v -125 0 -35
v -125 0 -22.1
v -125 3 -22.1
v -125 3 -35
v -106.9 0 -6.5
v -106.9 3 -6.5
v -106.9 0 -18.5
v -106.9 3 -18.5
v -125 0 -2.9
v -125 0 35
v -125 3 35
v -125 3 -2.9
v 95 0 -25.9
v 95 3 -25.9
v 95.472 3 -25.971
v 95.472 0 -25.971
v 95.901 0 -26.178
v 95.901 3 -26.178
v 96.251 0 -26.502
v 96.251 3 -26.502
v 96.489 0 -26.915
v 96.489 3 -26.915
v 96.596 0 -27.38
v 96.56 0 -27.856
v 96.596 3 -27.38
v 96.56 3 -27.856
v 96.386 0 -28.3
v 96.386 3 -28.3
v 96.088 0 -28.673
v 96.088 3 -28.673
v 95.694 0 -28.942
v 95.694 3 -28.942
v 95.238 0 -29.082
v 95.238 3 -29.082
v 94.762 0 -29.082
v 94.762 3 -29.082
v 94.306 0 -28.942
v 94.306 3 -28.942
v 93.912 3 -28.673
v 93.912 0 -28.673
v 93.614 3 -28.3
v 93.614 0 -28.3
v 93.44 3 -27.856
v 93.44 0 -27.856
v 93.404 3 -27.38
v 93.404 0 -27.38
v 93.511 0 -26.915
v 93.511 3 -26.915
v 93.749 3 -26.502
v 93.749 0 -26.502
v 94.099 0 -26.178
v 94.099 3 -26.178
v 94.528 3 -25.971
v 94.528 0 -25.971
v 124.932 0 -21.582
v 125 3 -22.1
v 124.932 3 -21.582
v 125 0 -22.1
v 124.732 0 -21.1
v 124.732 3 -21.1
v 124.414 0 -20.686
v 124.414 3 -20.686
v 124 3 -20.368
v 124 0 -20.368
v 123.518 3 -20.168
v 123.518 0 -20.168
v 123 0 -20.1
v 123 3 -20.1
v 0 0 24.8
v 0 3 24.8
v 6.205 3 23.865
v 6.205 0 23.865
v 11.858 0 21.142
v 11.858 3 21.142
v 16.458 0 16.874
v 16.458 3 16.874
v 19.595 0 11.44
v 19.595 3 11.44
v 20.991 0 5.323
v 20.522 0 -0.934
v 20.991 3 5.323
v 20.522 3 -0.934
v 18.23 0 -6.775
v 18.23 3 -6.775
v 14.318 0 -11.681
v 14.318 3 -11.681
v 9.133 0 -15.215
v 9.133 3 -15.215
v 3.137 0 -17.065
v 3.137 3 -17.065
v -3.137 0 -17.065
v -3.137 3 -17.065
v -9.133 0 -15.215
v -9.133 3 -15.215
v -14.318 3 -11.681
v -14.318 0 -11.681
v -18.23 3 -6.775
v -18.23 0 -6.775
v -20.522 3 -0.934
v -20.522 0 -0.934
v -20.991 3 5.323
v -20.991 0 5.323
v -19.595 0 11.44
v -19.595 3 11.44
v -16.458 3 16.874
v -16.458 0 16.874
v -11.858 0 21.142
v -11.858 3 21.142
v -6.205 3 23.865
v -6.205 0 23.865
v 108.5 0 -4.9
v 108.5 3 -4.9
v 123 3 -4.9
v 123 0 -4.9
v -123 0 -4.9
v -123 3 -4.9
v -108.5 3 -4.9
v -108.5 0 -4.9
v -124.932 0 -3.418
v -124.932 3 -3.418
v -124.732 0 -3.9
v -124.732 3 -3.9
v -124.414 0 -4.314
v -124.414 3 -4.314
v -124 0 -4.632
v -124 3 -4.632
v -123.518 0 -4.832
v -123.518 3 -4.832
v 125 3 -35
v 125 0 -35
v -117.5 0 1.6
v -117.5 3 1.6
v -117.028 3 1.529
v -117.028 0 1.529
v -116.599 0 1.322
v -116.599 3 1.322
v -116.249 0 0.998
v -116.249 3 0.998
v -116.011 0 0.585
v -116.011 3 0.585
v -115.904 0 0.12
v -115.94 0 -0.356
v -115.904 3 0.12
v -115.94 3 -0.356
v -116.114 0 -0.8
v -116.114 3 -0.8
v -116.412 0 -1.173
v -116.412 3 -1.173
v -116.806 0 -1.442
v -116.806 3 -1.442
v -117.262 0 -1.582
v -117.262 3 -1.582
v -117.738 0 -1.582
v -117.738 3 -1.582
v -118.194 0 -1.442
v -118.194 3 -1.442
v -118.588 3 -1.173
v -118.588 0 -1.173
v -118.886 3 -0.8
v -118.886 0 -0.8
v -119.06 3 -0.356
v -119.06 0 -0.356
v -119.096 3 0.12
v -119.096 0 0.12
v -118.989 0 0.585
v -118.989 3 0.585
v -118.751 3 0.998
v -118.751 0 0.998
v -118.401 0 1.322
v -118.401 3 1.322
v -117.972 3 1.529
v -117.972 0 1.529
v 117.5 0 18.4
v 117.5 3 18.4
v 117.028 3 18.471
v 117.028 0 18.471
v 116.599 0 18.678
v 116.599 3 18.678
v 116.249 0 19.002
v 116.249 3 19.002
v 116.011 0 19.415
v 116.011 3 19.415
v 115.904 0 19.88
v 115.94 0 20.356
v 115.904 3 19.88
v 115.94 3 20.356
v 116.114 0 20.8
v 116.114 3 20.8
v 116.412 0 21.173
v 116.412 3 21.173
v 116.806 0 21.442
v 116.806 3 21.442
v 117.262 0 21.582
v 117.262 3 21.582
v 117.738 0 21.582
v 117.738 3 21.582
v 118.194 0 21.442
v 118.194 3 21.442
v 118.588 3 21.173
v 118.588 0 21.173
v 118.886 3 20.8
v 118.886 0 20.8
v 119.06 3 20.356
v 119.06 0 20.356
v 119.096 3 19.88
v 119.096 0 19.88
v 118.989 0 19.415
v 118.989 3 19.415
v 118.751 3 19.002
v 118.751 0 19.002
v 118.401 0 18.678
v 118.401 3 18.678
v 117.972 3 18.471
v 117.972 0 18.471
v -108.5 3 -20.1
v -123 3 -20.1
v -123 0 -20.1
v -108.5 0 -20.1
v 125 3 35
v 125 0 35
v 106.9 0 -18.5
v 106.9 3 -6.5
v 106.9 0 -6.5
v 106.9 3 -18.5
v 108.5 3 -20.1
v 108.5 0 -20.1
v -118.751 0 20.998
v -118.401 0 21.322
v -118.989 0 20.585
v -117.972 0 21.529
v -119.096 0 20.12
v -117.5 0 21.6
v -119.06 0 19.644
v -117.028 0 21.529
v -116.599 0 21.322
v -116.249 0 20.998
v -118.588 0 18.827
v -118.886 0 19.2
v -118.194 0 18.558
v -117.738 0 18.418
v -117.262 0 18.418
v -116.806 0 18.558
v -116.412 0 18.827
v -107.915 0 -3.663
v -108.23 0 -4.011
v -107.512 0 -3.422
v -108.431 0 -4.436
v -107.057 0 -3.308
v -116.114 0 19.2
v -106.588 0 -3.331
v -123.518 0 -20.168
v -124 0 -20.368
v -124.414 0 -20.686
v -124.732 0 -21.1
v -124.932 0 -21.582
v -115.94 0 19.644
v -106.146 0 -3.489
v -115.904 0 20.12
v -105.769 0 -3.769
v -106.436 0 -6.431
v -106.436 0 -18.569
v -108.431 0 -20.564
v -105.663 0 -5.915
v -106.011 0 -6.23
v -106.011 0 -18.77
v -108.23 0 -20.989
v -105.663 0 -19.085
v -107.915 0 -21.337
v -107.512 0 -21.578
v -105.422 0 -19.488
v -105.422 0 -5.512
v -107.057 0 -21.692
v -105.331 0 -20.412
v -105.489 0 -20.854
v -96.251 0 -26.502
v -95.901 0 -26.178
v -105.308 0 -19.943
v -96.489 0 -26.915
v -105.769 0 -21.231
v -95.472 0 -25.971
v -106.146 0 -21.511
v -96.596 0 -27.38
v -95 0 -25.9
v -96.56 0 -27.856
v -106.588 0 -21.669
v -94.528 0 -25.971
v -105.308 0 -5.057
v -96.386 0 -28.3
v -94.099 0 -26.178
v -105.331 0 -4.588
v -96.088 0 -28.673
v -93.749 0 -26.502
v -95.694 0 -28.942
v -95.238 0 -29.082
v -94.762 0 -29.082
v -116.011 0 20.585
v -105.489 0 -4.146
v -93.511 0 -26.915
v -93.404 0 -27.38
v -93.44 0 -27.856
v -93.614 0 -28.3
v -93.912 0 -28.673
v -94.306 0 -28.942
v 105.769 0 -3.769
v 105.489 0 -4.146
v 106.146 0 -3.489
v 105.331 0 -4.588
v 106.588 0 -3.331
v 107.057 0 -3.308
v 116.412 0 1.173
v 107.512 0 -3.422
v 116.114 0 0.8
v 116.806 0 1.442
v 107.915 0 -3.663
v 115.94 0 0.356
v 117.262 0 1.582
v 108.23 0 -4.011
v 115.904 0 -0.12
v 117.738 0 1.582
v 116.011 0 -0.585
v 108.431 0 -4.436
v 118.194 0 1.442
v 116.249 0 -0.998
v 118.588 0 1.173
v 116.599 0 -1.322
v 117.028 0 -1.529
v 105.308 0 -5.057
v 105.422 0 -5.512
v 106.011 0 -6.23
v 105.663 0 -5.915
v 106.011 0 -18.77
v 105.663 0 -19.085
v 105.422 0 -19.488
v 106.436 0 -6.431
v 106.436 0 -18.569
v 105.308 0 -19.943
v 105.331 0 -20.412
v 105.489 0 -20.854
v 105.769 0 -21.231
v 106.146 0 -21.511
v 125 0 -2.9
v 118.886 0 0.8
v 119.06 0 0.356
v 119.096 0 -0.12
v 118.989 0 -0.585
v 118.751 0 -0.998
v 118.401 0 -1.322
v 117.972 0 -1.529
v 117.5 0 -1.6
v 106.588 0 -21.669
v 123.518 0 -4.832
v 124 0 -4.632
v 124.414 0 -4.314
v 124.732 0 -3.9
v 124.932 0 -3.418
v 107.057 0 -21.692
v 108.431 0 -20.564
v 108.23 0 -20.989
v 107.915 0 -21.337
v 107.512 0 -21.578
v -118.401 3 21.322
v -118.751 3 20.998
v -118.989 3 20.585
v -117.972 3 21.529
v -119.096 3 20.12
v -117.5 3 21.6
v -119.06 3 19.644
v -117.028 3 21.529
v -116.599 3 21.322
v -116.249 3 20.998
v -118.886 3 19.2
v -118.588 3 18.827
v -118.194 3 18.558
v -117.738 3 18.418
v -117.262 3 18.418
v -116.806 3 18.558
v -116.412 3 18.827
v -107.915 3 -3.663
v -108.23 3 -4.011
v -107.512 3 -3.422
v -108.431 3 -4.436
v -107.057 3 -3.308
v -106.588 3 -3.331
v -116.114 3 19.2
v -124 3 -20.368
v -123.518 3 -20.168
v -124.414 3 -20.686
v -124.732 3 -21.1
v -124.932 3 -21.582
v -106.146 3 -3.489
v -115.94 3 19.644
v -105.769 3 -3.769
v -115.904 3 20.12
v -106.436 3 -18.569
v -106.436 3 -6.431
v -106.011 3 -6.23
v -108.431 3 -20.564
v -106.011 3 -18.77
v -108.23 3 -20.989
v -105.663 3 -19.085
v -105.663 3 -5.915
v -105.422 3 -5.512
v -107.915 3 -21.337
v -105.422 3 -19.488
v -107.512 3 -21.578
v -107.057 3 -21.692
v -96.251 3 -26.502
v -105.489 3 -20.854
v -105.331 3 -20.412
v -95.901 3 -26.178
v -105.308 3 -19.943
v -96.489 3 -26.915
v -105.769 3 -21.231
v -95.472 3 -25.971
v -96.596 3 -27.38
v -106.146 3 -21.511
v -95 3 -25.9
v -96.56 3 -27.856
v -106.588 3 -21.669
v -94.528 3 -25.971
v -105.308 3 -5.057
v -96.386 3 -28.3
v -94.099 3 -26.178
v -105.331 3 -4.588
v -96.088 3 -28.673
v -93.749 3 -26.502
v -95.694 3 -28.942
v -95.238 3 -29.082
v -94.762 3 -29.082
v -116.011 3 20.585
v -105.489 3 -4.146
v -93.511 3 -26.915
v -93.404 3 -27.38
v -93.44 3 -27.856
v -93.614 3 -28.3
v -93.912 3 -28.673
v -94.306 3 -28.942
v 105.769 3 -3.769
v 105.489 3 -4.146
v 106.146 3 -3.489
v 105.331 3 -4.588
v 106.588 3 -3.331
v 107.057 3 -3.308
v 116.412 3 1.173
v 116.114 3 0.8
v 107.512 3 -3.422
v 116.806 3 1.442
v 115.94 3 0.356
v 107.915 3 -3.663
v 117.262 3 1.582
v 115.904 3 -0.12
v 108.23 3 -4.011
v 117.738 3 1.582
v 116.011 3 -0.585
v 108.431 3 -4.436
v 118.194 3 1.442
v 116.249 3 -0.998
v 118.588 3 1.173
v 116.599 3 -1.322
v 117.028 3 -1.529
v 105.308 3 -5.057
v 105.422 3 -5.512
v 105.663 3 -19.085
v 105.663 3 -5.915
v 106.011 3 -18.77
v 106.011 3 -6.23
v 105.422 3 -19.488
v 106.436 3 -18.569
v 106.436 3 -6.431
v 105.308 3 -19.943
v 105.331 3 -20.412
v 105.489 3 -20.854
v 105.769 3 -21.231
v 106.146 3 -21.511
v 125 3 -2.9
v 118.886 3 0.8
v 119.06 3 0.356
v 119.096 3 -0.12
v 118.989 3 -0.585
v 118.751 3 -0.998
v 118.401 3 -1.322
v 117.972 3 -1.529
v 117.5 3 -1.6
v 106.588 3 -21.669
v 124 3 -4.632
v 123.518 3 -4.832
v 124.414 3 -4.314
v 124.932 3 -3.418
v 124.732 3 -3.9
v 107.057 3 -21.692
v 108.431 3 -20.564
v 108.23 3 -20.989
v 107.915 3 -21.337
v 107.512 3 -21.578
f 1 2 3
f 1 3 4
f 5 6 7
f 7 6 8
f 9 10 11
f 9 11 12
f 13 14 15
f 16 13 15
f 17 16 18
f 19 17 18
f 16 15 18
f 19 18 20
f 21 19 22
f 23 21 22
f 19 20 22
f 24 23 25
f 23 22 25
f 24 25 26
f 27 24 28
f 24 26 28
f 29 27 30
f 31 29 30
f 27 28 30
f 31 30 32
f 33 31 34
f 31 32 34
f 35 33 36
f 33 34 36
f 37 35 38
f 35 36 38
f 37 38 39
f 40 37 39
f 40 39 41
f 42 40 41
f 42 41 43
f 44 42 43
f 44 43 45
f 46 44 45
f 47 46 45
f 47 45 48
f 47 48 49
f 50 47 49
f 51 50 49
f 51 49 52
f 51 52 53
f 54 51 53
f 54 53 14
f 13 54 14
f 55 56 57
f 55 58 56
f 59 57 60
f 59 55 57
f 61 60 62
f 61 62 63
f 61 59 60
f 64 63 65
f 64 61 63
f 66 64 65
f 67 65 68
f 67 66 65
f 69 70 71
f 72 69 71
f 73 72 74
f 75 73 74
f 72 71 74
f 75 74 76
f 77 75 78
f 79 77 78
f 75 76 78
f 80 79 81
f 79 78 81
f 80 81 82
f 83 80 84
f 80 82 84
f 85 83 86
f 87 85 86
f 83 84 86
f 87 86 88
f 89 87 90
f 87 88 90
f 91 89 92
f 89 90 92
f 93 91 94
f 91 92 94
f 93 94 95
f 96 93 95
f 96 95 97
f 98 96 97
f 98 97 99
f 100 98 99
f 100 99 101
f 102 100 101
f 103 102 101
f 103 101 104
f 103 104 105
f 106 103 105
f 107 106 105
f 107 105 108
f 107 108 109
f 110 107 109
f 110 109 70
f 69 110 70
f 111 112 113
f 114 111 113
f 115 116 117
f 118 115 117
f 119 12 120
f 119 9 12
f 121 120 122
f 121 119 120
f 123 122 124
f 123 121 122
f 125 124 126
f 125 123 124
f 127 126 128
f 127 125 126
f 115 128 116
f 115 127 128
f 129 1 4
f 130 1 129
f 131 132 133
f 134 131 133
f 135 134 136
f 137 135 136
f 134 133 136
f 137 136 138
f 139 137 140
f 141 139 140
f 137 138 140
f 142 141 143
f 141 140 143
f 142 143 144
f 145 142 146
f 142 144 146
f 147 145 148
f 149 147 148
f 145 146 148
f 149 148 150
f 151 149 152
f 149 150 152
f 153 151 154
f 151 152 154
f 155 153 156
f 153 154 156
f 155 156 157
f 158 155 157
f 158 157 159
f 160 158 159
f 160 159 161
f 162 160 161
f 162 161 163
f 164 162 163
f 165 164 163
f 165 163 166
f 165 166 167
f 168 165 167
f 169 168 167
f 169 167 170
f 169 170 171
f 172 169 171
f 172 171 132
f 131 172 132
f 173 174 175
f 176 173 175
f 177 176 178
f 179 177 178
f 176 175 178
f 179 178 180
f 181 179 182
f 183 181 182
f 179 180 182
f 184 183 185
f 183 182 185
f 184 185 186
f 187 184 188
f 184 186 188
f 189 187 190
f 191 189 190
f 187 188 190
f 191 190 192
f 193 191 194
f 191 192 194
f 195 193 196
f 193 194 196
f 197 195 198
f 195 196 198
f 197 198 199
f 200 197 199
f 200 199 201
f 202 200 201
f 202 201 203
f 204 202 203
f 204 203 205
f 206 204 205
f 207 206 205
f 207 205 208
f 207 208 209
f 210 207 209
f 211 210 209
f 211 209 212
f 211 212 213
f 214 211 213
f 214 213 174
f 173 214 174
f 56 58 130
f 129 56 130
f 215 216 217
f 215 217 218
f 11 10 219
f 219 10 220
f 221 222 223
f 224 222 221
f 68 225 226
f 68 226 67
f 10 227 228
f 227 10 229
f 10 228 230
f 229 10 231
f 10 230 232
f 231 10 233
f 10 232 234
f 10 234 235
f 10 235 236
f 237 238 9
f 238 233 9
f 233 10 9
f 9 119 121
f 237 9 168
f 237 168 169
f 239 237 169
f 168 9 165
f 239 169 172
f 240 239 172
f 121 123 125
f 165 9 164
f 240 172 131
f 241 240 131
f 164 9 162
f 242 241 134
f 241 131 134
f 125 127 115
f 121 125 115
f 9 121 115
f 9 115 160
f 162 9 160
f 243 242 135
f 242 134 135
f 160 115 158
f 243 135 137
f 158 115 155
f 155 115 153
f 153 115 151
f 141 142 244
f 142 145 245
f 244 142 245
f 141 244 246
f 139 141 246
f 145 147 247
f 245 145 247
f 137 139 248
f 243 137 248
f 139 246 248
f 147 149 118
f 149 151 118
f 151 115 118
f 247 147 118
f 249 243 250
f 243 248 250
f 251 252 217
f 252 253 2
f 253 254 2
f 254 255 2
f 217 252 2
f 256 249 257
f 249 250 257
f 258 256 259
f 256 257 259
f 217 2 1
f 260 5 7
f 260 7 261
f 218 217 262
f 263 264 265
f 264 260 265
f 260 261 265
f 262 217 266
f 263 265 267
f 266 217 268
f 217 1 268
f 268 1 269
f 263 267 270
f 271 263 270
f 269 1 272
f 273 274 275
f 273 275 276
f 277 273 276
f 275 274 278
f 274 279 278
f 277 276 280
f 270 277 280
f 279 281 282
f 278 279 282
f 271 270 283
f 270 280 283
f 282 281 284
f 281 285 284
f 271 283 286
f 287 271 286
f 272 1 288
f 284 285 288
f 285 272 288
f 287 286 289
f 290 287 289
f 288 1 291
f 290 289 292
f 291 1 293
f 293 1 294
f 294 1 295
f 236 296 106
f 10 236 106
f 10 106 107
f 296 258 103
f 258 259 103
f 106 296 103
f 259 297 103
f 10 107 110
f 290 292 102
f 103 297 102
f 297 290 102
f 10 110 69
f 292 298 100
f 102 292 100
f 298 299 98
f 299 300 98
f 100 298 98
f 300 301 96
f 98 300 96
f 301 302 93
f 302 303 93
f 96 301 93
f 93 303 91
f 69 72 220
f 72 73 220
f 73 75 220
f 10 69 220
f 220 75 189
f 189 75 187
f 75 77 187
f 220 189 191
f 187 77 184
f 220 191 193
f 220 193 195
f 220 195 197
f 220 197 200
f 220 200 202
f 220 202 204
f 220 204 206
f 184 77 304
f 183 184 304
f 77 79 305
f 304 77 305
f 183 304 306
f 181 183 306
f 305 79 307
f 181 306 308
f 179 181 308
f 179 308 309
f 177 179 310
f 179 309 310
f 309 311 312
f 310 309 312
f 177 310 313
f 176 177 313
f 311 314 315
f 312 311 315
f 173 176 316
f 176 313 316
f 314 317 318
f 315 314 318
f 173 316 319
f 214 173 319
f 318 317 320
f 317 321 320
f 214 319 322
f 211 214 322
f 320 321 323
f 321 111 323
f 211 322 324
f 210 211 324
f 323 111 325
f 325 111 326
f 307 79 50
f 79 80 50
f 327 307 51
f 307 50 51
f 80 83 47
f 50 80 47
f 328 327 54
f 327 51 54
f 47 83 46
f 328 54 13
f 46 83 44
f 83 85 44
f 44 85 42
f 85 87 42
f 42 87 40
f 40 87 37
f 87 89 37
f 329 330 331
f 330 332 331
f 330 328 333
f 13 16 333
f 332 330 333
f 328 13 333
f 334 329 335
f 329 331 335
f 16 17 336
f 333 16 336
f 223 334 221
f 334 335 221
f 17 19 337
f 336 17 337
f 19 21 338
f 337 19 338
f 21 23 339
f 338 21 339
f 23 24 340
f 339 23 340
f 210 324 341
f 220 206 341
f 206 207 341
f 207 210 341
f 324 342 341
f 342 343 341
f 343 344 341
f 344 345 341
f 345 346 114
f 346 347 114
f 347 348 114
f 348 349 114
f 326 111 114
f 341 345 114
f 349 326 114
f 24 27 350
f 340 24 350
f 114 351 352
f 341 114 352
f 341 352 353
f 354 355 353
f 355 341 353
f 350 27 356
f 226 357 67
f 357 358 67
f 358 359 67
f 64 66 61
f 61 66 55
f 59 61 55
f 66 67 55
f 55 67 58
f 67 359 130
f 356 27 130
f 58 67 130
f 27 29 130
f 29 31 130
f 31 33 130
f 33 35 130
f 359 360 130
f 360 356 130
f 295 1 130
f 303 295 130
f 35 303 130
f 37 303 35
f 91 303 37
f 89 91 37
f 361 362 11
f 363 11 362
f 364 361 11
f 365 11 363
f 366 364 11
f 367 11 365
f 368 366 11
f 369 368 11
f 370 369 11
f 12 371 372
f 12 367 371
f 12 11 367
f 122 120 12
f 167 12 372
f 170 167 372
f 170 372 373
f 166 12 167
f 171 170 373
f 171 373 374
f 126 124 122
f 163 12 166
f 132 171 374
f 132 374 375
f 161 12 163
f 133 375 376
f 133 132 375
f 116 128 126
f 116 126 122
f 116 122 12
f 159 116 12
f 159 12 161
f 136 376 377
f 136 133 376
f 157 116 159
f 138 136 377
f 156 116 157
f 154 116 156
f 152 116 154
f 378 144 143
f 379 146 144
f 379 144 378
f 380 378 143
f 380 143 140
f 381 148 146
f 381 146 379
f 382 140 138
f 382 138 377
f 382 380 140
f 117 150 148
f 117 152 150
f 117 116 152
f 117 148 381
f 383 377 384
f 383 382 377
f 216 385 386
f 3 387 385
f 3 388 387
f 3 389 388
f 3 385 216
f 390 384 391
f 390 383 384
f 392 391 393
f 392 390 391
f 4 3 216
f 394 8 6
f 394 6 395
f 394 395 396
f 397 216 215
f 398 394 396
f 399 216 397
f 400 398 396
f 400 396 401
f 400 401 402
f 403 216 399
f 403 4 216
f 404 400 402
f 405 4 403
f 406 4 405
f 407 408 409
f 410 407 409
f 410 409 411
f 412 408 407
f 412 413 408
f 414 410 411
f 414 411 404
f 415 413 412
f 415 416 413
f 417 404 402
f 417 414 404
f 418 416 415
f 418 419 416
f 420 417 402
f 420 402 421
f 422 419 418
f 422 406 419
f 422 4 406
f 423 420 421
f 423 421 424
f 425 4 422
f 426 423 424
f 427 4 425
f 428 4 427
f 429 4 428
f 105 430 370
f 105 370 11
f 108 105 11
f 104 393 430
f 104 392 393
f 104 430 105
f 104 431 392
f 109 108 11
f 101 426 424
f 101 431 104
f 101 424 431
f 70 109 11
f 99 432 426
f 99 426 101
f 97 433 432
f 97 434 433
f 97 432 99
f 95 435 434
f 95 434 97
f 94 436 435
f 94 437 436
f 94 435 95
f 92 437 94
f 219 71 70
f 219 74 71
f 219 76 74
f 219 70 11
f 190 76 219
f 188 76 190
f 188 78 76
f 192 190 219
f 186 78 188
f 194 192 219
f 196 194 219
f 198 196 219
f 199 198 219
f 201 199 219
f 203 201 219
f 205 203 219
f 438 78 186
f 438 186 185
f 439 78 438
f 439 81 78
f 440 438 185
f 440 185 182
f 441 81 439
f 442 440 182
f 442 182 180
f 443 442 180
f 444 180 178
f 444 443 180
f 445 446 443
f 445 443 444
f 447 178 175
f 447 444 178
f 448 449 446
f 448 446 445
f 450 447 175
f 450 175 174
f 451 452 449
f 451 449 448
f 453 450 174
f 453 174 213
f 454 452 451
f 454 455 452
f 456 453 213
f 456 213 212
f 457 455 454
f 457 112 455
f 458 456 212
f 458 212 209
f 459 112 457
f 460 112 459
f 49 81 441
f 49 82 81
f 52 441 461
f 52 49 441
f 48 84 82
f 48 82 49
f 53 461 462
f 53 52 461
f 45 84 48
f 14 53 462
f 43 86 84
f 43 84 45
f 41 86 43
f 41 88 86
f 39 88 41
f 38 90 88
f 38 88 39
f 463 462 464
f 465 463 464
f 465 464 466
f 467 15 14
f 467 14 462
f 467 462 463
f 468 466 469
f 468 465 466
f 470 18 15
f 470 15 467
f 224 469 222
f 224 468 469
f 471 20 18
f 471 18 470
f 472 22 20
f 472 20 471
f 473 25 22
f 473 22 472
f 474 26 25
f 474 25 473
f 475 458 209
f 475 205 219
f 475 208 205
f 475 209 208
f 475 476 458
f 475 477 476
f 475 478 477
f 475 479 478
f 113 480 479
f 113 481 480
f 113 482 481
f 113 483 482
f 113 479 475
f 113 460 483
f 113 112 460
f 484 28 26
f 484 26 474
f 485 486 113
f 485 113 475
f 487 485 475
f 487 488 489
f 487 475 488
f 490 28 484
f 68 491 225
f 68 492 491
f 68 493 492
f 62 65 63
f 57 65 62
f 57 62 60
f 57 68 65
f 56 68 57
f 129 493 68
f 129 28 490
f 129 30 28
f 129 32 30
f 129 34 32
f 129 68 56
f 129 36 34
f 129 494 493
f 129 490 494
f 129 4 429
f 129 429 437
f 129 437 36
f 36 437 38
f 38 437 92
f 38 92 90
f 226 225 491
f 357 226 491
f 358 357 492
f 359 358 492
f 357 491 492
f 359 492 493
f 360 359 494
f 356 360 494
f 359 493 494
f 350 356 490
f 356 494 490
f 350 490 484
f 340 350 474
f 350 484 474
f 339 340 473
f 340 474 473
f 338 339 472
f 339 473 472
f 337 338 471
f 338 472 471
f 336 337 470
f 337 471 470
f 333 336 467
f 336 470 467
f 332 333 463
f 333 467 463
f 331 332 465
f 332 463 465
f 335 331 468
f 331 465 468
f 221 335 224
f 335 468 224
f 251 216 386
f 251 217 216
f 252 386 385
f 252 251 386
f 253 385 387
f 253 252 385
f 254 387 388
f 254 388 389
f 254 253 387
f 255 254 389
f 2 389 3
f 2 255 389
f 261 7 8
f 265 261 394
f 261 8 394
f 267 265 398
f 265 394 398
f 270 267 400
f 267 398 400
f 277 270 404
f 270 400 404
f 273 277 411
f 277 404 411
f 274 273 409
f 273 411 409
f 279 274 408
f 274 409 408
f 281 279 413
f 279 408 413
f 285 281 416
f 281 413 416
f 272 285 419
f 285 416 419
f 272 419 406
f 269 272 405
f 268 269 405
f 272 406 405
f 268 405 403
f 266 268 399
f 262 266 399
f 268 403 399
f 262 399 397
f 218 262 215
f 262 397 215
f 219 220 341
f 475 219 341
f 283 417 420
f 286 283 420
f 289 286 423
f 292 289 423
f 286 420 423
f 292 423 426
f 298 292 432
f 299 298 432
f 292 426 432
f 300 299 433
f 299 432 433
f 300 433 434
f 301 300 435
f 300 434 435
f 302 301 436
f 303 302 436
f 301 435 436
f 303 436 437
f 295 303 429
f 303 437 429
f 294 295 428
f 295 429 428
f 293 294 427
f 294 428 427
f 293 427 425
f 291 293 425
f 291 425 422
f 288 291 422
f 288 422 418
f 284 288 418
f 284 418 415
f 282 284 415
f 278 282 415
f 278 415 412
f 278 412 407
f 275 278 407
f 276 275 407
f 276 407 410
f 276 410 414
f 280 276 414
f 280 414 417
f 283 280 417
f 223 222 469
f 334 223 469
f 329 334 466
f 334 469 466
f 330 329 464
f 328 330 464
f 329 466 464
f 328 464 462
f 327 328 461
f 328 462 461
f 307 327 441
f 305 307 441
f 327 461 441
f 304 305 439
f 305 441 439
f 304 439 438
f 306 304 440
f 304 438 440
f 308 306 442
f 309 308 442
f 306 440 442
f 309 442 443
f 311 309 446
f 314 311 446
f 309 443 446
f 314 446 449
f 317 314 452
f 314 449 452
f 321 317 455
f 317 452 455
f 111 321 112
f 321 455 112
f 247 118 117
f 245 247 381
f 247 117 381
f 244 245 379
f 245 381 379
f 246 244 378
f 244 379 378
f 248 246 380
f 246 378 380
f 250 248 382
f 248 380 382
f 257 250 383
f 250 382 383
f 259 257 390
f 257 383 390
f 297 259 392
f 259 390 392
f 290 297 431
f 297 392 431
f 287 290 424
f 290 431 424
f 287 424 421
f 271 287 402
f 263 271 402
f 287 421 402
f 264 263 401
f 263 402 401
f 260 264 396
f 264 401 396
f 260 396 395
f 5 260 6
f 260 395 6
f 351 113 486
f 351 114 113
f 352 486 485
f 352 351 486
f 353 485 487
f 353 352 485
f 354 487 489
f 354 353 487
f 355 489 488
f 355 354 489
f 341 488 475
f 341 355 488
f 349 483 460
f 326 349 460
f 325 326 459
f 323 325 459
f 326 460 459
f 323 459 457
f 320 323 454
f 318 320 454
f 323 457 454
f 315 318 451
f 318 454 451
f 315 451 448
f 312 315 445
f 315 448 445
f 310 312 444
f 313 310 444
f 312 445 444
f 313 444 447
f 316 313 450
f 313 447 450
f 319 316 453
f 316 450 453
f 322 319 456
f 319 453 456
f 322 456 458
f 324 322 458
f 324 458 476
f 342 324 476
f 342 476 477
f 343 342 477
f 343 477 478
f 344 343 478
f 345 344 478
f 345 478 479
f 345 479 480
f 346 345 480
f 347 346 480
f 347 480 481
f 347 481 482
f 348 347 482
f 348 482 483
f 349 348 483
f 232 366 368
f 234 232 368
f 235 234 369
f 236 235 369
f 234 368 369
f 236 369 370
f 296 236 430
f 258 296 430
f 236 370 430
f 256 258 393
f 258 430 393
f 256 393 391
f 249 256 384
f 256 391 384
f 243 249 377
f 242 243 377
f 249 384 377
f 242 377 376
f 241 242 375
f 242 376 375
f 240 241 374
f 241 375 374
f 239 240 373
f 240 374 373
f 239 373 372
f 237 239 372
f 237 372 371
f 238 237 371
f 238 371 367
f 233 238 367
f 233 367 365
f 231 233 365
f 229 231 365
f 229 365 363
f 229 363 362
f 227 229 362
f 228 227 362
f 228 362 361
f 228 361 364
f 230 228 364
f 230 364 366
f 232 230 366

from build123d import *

# Parameters (mm, degrees)
SKETCH_1_W          = 250
SKETCH_1_H          = 70
EXTRUDE_1_DEPTH     = 3
SKETCH_2_R          = 1.6
CUT_EXTRUDE_1_DEPTH = 130.842211934
SKETCH_4_W          = 18.1
SKETCH_4_H          = 15.2
CUT_EXTRUDE_3_DEPTH = 130.842211934
FILLET_2_R          = 2
SKETCH_5_R          = 1.6
CUT_EXTRUDE_4_DEPTH = 130.842211934
SKETCH_6_R          = 21.05
CUT_EXTRUDE_5_DEPTH = 130.842211934


with BuildPart() as part:
    # 草图1 → 凸台-拉伸1 (new body)
    with BuildSketch(Plane(origin=(0, 0, 0), x_dir=(1, 0, 0), z_dir=(0, 1, 0))):
        Rectangle(SKETCH_1_W, SKETCH_1_H)
    extrude(amount=EXTRUDE_1_DEPTH)

    # 草图2 → 切除-拉伸1 (cut, through all)
    with BuildSketch(Plane(origin=(0, 3, 0), x_dir=(1, 0, 0), z_dir=(0, 1, 0))):
        with Locations(Location((-95, 27.5, 0), (0, 0, 270))):
            Circle(SKETCH_2_R)
        with Locations(Location((95, 27.5, 0), (0, 0, 270))):
            Circle(SKETCH_2_R)
        with Locations(Location((-117.5, 0, 0), (0, 0, 270))):
            Circle(SKETCH_2_R)
        with Locations(Location((-117.5, -20, 0), (0, 0, 270))):
            Circle(SKETCH_2_R)
        with Locations(Location((117.5, -20, 0), (0, 0, 90))):
            Circle(SKETCH_2_R)
        with Locations(Location((117.5, 0, 0), (0, 0, 90))):
            Circle(SKETCH_2_R)
    extrude(amount=-CUT_EXTRUDE_1_DEPTH, mode=Mode.SUBTRACT)

    # 草图4 → 切除-拉伸3 (cut, through all)
    with BuildSketch(Plane(origin=(0, 3, 0), x_dir=(1, 0, 0), z_dir=(0, 1, 0))):
        with Locations((-115.95, 12.5)):
            Rectangle(SKETCH_4_W, SKETCH_4_H)
        with Locations((115.95, 12.5)):
            Rectangle(SKETCH_4_W, SKETCH_4_H)
    extrude(amount=-CUT_EXTRUDE_3_DEPTH, mode=Mode.SUBTRACT)

    # 圆角2
    fillet_2_edges = [part.edges().sort_by_distance(p)[0] for p in [
        (-125, 1.5, -4.9),
        (-125, 1.5, -20.1),
        (125, 1.5, -20.1),
        (125, 1.5, -4.9),
    ]]
    fillet(fillet_2_edges, radius=FILLET_2_R)

    # 草图5 → 切除-拉伸4 (cut, through all)
    with BuildSketch(Plane(origin=(0, 3, 0), x_dir=(1, 0, 0), z_dir=(0, 1, 0))):
        with Locations((-106.9, 20.1)):
            Circle(SKETCH_5_R)
        with Locations((-106.9, 4.9)):
            Circle(SKETCH_5_R)
        with Locations((106.9, 4.9)):
            Circle(SKETCH_5_R)
        with Locations((106.9, 20.1)):
            Circle(SKETCH_5_R)
    extrude(amount=-CUT_EXTRUDE_4_DEPTH, mode=Mode.SUBTRACT)

    # 草图6 → 切除-拉伸5 (cut, through all)
    with BuildSketch(Plane(origin=(0, 3, 0), x_dir=(1, 0, 0), z_dir=(0, 1, 0))):
        with Locations(Location((0, -3.75, 0), (0, 0, 270))):
            Circle(SKETCH_6_R)
    extrude(amount=-CUT_EXTRUDE_5_DEPTH, mode=Mode.SUBTRACT)


solid = part.part
